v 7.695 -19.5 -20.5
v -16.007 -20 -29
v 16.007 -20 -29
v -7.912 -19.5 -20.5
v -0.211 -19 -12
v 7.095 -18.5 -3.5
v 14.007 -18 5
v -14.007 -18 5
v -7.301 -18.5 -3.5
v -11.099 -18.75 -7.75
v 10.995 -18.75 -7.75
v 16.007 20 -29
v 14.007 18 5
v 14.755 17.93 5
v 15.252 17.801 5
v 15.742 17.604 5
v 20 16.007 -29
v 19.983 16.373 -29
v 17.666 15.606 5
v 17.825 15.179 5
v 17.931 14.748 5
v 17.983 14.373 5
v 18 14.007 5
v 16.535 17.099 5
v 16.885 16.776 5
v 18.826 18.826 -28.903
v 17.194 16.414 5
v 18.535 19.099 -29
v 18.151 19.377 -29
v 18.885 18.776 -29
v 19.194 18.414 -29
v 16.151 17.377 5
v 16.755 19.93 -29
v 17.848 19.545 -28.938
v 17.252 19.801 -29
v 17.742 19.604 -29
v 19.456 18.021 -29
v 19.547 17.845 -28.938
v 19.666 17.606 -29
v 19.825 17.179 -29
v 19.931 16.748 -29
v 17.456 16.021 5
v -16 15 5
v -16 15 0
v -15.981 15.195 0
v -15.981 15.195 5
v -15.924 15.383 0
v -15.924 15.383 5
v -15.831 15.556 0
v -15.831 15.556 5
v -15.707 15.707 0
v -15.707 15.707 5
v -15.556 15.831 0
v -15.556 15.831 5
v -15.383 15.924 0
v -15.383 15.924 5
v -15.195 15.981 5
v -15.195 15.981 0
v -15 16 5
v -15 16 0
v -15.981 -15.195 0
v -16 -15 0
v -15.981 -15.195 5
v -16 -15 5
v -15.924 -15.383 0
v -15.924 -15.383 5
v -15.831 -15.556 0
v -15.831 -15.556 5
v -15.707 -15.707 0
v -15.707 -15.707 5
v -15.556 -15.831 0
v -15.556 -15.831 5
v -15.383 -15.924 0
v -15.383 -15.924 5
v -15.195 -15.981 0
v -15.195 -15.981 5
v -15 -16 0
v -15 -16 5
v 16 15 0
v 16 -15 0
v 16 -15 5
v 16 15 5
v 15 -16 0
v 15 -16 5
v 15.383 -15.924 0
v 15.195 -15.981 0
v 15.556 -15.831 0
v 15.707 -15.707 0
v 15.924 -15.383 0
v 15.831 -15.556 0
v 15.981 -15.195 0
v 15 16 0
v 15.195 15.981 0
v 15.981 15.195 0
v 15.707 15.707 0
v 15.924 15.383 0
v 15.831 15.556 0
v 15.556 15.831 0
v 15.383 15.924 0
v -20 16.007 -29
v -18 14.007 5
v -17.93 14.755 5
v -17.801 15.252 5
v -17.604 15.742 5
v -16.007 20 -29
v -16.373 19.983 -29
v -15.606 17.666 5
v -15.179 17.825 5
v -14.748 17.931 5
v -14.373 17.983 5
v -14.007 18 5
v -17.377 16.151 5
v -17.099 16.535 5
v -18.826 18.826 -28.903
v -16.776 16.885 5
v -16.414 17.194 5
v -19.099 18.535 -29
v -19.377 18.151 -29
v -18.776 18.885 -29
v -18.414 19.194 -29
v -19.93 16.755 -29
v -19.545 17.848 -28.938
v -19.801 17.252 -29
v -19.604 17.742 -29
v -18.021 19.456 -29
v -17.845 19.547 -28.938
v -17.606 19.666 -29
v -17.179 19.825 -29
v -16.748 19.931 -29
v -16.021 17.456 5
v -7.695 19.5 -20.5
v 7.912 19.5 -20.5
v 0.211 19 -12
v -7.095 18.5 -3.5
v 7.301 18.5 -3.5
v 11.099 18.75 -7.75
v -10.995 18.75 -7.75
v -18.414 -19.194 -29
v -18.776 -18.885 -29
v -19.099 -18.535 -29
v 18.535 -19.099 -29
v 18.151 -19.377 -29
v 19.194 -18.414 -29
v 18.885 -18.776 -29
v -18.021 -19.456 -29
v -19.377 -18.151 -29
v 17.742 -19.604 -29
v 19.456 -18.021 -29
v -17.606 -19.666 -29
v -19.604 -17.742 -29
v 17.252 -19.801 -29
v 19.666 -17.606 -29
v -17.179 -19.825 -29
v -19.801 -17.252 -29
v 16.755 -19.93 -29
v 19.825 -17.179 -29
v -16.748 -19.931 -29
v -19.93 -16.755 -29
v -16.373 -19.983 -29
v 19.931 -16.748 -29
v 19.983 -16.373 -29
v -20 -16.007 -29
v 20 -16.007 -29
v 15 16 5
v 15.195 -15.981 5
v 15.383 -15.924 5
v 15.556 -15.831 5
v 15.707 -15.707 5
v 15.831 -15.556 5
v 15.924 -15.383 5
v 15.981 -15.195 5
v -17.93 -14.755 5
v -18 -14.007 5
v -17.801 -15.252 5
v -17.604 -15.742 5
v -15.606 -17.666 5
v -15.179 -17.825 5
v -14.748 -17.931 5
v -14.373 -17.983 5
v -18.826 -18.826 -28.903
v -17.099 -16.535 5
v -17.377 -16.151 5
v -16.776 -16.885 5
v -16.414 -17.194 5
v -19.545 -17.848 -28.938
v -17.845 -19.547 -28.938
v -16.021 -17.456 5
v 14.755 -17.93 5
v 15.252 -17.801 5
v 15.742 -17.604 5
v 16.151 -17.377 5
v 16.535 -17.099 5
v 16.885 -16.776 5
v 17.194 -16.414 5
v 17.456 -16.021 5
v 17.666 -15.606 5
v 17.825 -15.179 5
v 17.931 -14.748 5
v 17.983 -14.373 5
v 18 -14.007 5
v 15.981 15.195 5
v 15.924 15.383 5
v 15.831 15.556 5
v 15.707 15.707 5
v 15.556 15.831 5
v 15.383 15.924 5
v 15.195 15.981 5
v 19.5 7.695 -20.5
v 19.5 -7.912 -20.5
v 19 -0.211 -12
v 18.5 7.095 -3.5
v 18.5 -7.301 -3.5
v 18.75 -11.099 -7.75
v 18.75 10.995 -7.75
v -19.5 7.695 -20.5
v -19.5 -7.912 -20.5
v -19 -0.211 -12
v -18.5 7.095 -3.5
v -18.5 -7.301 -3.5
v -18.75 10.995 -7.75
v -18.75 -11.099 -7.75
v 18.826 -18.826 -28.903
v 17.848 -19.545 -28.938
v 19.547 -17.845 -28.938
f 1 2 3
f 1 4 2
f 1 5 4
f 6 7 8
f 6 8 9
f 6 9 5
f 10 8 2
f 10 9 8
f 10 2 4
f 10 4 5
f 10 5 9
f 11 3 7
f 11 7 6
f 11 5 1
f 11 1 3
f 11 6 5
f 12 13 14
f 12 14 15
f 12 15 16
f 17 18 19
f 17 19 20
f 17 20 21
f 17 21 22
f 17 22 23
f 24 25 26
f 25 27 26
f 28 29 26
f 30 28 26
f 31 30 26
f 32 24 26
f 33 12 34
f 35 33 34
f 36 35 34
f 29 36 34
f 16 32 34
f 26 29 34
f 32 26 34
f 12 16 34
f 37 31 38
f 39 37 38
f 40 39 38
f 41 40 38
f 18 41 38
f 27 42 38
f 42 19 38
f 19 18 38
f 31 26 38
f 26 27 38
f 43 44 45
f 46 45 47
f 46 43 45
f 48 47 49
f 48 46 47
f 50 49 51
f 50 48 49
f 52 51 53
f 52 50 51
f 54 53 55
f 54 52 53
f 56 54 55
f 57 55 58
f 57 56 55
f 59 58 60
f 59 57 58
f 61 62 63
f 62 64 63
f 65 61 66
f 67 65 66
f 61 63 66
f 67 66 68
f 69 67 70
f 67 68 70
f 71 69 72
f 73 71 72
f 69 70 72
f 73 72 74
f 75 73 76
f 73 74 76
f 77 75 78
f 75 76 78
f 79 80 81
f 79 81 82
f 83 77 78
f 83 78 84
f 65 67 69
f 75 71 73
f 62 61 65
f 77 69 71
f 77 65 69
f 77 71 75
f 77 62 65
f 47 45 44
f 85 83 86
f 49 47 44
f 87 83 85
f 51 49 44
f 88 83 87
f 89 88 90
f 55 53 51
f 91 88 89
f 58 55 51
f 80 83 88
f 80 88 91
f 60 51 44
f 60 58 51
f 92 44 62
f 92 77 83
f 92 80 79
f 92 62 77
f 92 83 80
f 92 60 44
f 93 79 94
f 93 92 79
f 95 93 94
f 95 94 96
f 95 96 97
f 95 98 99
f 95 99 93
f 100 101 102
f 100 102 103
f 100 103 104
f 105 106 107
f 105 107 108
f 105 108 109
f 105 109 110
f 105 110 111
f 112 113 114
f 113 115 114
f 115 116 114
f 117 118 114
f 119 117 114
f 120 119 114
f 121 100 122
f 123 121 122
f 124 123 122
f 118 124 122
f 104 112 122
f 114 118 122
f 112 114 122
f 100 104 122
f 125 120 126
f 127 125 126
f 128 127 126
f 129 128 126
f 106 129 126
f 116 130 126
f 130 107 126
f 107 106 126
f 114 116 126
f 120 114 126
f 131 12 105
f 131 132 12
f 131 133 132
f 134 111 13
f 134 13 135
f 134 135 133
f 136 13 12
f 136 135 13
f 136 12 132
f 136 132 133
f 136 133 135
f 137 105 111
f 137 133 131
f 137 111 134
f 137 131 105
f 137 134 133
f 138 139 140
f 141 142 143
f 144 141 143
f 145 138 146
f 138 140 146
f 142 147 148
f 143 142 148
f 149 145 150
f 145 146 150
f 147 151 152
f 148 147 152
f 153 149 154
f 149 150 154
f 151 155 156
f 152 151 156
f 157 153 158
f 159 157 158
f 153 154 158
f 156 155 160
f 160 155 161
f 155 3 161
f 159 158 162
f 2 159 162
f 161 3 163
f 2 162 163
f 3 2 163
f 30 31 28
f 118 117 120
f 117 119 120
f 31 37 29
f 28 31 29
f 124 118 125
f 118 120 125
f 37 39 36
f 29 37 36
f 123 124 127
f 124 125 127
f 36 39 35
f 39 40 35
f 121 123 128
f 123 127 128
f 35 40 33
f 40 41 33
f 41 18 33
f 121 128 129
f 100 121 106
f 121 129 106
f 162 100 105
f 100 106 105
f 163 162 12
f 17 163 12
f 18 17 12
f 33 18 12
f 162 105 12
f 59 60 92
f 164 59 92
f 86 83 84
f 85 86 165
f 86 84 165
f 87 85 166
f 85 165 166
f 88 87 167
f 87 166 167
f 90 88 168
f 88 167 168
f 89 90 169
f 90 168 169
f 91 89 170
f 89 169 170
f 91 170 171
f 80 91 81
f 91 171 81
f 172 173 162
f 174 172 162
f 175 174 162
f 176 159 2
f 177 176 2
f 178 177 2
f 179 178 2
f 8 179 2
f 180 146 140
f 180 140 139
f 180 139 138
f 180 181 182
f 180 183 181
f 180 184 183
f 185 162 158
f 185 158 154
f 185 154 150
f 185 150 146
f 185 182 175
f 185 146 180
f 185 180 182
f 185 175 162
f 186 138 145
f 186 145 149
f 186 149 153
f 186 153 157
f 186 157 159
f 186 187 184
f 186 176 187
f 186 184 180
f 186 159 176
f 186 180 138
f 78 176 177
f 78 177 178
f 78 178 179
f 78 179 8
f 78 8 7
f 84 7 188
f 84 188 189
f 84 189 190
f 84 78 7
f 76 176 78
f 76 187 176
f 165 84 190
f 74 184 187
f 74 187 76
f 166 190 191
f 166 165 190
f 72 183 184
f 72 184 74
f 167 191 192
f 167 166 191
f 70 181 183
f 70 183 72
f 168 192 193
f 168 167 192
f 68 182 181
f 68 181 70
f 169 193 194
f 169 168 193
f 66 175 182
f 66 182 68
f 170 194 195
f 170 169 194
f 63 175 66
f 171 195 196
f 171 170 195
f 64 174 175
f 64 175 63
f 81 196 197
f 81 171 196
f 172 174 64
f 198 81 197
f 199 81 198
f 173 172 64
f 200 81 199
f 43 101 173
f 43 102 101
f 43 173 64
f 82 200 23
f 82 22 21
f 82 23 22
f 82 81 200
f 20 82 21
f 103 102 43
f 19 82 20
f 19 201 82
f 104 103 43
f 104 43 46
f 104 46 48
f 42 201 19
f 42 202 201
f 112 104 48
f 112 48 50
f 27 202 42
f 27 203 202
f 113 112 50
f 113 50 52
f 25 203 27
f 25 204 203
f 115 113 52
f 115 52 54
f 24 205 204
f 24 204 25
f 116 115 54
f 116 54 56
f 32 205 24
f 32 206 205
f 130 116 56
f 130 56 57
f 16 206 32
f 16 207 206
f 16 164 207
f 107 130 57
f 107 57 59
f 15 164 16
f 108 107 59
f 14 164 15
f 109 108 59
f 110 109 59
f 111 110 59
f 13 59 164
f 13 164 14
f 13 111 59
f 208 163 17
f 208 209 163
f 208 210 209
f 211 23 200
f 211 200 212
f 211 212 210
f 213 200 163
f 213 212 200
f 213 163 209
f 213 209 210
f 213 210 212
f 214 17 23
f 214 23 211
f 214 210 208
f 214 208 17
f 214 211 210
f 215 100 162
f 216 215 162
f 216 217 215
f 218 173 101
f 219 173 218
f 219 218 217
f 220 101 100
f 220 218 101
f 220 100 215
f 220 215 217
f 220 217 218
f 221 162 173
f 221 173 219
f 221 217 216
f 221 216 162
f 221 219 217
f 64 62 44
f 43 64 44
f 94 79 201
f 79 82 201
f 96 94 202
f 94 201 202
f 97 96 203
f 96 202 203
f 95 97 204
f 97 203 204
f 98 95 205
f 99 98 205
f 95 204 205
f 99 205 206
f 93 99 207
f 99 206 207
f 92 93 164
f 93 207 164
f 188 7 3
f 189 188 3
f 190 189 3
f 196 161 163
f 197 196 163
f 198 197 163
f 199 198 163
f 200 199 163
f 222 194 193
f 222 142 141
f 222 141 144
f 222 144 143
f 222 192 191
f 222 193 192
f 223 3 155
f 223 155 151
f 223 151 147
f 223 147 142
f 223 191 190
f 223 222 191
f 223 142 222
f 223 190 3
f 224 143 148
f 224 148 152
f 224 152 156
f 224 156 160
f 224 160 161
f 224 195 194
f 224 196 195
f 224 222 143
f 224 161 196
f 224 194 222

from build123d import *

# Parameters (mm, degrees)
F4_W     = 40
F4_H     = 40
F5_W     = 36
F5_H     = 36
F0_W     = 32
F0_H     = 32
F7_DEPTH = 25
F8_R     = 4
F9_R     = 1


with BuildPart() as f6:
    # F4 (on plane+point) → F6 section 0
    with BuildSketch(Plane.XY.offset(-29)):
        Rectangle(F4_W, F4_H)
    # F5 (on offset) → F6 section 1
    with BuildSketch(Plane.XY.offset(5)):
        Rectangle(F5_W, F5_H)
    loft()

    # F0 (on Top) → F7 (cut)
    with BuildSketch(Plane.XY):
        Rectangle(F0_W, F0_H)
    extrude(amount=F7_DEPTH, mode=Mode.SUBTRACT)

    # F8
    f8_edges = [f6.edges().sort_by_distance(p)[0] for p in [
        (19, -19, -12),
        (19, 19, -12),
        (-19, -19, -12),
        (-19, 19, -12),
    ]]
    fillet(f8_edges, radius=F8_R)

    # F9
    f9_edges = [f6.edges().sort_by_distance(p)[0] for p in [
        (-16, 16, 2.5),
        (16, 16, 2.5),
        (16, -16, 2.5),
        (-16, -16, 2.5),
    ]]
    fillet(f9_edges, radius=F9_R)


solid = f6.part
